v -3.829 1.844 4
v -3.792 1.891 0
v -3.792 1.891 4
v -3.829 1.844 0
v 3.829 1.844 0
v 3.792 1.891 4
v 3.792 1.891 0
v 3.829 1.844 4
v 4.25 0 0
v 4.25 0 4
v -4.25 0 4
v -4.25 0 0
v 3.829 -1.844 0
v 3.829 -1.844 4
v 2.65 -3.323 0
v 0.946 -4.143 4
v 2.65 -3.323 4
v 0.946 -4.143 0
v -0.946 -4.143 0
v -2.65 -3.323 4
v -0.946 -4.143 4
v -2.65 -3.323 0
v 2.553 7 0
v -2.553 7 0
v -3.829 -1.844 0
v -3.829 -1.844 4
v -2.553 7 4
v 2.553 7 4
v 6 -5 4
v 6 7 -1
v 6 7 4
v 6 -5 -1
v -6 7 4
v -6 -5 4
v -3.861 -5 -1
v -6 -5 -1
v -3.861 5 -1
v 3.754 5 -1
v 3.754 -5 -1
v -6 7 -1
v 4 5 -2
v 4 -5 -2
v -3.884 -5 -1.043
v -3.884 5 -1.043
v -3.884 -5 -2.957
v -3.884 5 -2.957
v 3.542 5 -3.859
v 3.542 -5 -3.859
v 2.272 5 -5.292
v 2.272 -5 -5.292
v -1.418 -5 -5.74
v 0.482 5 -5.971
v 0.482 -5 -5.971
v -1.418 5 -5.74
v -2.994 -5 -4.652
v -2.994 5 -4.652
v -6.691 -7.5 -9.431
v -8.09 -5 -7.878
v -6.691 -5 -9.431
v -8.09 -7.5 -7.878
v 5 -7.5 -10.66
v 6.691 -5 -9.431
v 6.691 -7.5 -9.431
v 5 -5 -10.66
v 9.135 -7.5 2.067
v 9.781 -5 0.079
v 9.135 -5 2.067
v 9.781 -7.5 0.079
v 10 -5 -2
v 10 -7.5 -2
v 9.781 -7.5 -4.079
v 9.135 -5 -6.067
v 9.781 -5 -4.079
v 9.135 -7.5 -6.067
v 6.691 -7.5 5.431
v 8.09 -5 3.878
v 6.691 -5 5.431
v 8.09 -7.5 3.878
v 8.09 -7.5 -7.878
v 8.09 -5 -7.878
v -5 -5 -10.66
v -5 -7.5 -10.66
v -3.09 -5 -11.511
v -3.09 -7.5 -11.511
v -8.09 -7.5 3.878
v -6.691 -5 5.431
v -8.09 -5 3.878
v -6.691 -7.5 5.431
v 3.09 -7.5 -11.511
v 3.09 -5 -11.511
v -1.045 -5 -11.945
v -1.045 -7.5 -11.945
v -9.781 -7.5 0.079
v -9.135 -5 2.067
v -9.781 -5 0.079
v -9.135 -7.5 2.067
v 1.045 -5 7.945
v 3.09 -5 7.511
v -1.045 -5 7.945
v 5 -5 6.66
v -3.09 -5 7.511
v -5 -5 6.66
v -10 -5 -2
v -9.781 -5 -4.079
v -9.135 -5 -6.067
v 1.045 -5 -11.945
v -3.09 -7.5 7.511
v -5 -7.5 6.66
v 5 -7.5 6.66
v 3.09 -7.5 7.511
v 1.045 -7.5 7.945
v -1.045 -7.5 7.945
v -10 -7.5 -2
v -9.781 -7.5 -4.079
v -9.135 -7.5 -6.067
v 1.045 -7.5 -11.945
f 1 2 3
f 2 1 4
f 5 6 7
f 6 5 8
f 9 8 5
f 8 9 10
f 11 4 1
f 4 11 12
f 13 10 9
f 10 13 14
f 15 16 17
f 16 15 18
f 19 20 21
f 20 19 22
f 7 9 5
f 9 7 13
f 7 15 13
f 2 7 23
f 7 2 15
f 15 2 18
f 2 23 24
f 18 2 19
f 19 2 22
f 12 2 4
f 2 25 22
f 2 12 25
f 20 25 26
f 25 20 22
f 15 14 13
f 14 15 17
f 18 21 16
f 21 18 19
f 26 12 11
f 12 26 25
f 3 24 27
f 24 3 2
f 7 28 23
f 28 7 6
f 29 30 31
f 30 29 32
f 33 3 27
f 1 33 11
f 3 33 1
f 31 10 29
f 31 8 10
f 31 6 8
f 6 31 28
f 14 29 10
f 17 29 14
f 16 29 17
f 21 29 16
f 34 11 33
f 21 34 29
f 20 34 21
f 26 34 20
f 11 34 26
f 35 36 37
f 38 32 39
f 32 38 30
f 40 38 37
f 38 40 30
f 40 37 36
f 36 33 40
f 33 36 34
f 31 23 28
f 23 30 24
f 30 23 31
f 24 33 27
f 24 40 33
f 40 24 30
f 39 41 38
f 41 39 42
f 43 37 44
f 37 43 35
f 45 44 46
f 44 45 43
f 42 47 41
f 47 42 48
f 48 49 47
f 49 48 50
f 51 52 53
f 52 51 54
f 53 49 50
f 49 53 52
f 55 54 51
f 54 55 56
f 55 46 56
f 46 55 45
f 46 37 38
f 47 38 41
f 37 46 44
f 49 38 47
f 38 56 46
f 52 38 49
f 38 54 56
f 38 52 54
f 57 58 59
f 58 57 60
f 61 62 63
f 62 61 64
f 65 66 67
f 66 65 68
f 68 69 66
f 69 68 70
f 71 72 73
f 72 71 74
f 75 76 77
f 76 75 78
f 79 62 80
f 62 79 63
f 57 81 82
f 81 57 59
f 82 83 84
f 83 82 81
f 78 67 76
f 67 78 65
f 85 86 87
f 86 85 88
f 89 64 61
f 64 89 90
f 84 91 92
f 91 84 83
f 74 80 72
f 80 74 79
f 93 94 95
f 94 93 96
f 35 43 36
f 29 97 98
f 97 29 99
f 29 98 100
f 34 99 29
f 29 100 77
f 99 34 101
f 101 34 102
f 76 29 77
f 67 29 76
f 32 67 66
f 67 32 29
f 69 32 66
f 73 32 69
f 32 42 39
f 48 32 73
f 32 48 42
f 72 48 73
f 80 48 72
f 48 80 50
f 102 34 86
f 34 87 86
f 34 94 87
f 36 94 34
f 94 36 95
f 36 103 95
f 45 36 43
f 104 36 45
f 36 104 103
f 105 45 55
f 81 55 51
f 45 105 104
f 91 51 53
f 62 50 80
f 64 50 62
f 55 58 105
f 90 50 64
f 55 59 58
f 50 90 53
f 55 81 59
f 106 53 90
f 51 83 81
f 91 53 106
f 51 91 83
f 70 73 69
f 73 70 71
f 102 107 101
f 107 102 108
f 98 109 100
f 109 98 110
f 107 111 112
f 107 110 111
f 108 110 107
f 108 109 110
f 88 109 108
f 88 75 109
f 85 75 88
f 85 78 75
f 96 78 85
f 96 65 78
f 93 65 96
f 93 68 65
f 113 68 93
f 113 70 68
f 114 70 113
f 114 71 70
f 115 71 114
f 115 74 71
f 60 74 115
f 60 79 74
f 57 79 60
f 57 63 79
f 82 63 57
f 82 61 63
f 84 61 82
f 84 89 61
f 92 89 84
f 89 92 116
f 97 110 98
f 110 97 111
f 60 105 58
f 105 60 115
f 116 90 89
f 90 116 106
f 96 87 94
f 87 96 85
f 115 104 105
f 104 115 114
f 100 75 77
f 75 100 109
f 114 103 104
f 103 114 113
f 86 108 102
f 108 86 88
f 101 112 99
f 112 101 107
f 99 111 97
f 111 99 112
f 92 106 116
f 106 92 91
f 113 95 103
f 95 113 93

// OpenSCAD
// acc holder


module acc(){
    union(){cylinder(r =7.13/2, r = 7.13/2,5); 
    
    path_pts = [
    [-7.13/2, 0],
    [7.13/2, 0],
    [2, 6.22], 
    [-2, 6.22]
];

linear_extrude(4.9) polygon(path_pts);
    
}}










module acc_space(dia){
   
    union(){cylinder(r =dia/2, r = dia/2,6.3); 
    
     path_pts2 = [
    [-8.5/2, 0],
    [8.5/2, 0],
    [2.5, 7.22], 
    [-2.5, 7.22]
];


linear_extrude(6) polygon(path_pts2);
    
}}



module accHolder(){
difference(){


translate([-6, -6, -1]) cube([12, 13, 5]);
    acc_space(8.5);}}
    
    
 
  difference(){  
   union(){ 
       accHolder();
    translate([0,5,-2])   
 difference(){   
rotate([90,0,0]) cylinder(r =4, r = 4,11);
    translate([-10, -16, 1]) cube([20, 20, 20]); }
    
    translate([0,-5,-2]) rotate([90,0,0]) cylinder(r =10, r = 10,2.5);
    }

//translate([0,10,-2])    rotate([90,0,0]) cylinder(r =0.5, r = 0.5,50);
    }
